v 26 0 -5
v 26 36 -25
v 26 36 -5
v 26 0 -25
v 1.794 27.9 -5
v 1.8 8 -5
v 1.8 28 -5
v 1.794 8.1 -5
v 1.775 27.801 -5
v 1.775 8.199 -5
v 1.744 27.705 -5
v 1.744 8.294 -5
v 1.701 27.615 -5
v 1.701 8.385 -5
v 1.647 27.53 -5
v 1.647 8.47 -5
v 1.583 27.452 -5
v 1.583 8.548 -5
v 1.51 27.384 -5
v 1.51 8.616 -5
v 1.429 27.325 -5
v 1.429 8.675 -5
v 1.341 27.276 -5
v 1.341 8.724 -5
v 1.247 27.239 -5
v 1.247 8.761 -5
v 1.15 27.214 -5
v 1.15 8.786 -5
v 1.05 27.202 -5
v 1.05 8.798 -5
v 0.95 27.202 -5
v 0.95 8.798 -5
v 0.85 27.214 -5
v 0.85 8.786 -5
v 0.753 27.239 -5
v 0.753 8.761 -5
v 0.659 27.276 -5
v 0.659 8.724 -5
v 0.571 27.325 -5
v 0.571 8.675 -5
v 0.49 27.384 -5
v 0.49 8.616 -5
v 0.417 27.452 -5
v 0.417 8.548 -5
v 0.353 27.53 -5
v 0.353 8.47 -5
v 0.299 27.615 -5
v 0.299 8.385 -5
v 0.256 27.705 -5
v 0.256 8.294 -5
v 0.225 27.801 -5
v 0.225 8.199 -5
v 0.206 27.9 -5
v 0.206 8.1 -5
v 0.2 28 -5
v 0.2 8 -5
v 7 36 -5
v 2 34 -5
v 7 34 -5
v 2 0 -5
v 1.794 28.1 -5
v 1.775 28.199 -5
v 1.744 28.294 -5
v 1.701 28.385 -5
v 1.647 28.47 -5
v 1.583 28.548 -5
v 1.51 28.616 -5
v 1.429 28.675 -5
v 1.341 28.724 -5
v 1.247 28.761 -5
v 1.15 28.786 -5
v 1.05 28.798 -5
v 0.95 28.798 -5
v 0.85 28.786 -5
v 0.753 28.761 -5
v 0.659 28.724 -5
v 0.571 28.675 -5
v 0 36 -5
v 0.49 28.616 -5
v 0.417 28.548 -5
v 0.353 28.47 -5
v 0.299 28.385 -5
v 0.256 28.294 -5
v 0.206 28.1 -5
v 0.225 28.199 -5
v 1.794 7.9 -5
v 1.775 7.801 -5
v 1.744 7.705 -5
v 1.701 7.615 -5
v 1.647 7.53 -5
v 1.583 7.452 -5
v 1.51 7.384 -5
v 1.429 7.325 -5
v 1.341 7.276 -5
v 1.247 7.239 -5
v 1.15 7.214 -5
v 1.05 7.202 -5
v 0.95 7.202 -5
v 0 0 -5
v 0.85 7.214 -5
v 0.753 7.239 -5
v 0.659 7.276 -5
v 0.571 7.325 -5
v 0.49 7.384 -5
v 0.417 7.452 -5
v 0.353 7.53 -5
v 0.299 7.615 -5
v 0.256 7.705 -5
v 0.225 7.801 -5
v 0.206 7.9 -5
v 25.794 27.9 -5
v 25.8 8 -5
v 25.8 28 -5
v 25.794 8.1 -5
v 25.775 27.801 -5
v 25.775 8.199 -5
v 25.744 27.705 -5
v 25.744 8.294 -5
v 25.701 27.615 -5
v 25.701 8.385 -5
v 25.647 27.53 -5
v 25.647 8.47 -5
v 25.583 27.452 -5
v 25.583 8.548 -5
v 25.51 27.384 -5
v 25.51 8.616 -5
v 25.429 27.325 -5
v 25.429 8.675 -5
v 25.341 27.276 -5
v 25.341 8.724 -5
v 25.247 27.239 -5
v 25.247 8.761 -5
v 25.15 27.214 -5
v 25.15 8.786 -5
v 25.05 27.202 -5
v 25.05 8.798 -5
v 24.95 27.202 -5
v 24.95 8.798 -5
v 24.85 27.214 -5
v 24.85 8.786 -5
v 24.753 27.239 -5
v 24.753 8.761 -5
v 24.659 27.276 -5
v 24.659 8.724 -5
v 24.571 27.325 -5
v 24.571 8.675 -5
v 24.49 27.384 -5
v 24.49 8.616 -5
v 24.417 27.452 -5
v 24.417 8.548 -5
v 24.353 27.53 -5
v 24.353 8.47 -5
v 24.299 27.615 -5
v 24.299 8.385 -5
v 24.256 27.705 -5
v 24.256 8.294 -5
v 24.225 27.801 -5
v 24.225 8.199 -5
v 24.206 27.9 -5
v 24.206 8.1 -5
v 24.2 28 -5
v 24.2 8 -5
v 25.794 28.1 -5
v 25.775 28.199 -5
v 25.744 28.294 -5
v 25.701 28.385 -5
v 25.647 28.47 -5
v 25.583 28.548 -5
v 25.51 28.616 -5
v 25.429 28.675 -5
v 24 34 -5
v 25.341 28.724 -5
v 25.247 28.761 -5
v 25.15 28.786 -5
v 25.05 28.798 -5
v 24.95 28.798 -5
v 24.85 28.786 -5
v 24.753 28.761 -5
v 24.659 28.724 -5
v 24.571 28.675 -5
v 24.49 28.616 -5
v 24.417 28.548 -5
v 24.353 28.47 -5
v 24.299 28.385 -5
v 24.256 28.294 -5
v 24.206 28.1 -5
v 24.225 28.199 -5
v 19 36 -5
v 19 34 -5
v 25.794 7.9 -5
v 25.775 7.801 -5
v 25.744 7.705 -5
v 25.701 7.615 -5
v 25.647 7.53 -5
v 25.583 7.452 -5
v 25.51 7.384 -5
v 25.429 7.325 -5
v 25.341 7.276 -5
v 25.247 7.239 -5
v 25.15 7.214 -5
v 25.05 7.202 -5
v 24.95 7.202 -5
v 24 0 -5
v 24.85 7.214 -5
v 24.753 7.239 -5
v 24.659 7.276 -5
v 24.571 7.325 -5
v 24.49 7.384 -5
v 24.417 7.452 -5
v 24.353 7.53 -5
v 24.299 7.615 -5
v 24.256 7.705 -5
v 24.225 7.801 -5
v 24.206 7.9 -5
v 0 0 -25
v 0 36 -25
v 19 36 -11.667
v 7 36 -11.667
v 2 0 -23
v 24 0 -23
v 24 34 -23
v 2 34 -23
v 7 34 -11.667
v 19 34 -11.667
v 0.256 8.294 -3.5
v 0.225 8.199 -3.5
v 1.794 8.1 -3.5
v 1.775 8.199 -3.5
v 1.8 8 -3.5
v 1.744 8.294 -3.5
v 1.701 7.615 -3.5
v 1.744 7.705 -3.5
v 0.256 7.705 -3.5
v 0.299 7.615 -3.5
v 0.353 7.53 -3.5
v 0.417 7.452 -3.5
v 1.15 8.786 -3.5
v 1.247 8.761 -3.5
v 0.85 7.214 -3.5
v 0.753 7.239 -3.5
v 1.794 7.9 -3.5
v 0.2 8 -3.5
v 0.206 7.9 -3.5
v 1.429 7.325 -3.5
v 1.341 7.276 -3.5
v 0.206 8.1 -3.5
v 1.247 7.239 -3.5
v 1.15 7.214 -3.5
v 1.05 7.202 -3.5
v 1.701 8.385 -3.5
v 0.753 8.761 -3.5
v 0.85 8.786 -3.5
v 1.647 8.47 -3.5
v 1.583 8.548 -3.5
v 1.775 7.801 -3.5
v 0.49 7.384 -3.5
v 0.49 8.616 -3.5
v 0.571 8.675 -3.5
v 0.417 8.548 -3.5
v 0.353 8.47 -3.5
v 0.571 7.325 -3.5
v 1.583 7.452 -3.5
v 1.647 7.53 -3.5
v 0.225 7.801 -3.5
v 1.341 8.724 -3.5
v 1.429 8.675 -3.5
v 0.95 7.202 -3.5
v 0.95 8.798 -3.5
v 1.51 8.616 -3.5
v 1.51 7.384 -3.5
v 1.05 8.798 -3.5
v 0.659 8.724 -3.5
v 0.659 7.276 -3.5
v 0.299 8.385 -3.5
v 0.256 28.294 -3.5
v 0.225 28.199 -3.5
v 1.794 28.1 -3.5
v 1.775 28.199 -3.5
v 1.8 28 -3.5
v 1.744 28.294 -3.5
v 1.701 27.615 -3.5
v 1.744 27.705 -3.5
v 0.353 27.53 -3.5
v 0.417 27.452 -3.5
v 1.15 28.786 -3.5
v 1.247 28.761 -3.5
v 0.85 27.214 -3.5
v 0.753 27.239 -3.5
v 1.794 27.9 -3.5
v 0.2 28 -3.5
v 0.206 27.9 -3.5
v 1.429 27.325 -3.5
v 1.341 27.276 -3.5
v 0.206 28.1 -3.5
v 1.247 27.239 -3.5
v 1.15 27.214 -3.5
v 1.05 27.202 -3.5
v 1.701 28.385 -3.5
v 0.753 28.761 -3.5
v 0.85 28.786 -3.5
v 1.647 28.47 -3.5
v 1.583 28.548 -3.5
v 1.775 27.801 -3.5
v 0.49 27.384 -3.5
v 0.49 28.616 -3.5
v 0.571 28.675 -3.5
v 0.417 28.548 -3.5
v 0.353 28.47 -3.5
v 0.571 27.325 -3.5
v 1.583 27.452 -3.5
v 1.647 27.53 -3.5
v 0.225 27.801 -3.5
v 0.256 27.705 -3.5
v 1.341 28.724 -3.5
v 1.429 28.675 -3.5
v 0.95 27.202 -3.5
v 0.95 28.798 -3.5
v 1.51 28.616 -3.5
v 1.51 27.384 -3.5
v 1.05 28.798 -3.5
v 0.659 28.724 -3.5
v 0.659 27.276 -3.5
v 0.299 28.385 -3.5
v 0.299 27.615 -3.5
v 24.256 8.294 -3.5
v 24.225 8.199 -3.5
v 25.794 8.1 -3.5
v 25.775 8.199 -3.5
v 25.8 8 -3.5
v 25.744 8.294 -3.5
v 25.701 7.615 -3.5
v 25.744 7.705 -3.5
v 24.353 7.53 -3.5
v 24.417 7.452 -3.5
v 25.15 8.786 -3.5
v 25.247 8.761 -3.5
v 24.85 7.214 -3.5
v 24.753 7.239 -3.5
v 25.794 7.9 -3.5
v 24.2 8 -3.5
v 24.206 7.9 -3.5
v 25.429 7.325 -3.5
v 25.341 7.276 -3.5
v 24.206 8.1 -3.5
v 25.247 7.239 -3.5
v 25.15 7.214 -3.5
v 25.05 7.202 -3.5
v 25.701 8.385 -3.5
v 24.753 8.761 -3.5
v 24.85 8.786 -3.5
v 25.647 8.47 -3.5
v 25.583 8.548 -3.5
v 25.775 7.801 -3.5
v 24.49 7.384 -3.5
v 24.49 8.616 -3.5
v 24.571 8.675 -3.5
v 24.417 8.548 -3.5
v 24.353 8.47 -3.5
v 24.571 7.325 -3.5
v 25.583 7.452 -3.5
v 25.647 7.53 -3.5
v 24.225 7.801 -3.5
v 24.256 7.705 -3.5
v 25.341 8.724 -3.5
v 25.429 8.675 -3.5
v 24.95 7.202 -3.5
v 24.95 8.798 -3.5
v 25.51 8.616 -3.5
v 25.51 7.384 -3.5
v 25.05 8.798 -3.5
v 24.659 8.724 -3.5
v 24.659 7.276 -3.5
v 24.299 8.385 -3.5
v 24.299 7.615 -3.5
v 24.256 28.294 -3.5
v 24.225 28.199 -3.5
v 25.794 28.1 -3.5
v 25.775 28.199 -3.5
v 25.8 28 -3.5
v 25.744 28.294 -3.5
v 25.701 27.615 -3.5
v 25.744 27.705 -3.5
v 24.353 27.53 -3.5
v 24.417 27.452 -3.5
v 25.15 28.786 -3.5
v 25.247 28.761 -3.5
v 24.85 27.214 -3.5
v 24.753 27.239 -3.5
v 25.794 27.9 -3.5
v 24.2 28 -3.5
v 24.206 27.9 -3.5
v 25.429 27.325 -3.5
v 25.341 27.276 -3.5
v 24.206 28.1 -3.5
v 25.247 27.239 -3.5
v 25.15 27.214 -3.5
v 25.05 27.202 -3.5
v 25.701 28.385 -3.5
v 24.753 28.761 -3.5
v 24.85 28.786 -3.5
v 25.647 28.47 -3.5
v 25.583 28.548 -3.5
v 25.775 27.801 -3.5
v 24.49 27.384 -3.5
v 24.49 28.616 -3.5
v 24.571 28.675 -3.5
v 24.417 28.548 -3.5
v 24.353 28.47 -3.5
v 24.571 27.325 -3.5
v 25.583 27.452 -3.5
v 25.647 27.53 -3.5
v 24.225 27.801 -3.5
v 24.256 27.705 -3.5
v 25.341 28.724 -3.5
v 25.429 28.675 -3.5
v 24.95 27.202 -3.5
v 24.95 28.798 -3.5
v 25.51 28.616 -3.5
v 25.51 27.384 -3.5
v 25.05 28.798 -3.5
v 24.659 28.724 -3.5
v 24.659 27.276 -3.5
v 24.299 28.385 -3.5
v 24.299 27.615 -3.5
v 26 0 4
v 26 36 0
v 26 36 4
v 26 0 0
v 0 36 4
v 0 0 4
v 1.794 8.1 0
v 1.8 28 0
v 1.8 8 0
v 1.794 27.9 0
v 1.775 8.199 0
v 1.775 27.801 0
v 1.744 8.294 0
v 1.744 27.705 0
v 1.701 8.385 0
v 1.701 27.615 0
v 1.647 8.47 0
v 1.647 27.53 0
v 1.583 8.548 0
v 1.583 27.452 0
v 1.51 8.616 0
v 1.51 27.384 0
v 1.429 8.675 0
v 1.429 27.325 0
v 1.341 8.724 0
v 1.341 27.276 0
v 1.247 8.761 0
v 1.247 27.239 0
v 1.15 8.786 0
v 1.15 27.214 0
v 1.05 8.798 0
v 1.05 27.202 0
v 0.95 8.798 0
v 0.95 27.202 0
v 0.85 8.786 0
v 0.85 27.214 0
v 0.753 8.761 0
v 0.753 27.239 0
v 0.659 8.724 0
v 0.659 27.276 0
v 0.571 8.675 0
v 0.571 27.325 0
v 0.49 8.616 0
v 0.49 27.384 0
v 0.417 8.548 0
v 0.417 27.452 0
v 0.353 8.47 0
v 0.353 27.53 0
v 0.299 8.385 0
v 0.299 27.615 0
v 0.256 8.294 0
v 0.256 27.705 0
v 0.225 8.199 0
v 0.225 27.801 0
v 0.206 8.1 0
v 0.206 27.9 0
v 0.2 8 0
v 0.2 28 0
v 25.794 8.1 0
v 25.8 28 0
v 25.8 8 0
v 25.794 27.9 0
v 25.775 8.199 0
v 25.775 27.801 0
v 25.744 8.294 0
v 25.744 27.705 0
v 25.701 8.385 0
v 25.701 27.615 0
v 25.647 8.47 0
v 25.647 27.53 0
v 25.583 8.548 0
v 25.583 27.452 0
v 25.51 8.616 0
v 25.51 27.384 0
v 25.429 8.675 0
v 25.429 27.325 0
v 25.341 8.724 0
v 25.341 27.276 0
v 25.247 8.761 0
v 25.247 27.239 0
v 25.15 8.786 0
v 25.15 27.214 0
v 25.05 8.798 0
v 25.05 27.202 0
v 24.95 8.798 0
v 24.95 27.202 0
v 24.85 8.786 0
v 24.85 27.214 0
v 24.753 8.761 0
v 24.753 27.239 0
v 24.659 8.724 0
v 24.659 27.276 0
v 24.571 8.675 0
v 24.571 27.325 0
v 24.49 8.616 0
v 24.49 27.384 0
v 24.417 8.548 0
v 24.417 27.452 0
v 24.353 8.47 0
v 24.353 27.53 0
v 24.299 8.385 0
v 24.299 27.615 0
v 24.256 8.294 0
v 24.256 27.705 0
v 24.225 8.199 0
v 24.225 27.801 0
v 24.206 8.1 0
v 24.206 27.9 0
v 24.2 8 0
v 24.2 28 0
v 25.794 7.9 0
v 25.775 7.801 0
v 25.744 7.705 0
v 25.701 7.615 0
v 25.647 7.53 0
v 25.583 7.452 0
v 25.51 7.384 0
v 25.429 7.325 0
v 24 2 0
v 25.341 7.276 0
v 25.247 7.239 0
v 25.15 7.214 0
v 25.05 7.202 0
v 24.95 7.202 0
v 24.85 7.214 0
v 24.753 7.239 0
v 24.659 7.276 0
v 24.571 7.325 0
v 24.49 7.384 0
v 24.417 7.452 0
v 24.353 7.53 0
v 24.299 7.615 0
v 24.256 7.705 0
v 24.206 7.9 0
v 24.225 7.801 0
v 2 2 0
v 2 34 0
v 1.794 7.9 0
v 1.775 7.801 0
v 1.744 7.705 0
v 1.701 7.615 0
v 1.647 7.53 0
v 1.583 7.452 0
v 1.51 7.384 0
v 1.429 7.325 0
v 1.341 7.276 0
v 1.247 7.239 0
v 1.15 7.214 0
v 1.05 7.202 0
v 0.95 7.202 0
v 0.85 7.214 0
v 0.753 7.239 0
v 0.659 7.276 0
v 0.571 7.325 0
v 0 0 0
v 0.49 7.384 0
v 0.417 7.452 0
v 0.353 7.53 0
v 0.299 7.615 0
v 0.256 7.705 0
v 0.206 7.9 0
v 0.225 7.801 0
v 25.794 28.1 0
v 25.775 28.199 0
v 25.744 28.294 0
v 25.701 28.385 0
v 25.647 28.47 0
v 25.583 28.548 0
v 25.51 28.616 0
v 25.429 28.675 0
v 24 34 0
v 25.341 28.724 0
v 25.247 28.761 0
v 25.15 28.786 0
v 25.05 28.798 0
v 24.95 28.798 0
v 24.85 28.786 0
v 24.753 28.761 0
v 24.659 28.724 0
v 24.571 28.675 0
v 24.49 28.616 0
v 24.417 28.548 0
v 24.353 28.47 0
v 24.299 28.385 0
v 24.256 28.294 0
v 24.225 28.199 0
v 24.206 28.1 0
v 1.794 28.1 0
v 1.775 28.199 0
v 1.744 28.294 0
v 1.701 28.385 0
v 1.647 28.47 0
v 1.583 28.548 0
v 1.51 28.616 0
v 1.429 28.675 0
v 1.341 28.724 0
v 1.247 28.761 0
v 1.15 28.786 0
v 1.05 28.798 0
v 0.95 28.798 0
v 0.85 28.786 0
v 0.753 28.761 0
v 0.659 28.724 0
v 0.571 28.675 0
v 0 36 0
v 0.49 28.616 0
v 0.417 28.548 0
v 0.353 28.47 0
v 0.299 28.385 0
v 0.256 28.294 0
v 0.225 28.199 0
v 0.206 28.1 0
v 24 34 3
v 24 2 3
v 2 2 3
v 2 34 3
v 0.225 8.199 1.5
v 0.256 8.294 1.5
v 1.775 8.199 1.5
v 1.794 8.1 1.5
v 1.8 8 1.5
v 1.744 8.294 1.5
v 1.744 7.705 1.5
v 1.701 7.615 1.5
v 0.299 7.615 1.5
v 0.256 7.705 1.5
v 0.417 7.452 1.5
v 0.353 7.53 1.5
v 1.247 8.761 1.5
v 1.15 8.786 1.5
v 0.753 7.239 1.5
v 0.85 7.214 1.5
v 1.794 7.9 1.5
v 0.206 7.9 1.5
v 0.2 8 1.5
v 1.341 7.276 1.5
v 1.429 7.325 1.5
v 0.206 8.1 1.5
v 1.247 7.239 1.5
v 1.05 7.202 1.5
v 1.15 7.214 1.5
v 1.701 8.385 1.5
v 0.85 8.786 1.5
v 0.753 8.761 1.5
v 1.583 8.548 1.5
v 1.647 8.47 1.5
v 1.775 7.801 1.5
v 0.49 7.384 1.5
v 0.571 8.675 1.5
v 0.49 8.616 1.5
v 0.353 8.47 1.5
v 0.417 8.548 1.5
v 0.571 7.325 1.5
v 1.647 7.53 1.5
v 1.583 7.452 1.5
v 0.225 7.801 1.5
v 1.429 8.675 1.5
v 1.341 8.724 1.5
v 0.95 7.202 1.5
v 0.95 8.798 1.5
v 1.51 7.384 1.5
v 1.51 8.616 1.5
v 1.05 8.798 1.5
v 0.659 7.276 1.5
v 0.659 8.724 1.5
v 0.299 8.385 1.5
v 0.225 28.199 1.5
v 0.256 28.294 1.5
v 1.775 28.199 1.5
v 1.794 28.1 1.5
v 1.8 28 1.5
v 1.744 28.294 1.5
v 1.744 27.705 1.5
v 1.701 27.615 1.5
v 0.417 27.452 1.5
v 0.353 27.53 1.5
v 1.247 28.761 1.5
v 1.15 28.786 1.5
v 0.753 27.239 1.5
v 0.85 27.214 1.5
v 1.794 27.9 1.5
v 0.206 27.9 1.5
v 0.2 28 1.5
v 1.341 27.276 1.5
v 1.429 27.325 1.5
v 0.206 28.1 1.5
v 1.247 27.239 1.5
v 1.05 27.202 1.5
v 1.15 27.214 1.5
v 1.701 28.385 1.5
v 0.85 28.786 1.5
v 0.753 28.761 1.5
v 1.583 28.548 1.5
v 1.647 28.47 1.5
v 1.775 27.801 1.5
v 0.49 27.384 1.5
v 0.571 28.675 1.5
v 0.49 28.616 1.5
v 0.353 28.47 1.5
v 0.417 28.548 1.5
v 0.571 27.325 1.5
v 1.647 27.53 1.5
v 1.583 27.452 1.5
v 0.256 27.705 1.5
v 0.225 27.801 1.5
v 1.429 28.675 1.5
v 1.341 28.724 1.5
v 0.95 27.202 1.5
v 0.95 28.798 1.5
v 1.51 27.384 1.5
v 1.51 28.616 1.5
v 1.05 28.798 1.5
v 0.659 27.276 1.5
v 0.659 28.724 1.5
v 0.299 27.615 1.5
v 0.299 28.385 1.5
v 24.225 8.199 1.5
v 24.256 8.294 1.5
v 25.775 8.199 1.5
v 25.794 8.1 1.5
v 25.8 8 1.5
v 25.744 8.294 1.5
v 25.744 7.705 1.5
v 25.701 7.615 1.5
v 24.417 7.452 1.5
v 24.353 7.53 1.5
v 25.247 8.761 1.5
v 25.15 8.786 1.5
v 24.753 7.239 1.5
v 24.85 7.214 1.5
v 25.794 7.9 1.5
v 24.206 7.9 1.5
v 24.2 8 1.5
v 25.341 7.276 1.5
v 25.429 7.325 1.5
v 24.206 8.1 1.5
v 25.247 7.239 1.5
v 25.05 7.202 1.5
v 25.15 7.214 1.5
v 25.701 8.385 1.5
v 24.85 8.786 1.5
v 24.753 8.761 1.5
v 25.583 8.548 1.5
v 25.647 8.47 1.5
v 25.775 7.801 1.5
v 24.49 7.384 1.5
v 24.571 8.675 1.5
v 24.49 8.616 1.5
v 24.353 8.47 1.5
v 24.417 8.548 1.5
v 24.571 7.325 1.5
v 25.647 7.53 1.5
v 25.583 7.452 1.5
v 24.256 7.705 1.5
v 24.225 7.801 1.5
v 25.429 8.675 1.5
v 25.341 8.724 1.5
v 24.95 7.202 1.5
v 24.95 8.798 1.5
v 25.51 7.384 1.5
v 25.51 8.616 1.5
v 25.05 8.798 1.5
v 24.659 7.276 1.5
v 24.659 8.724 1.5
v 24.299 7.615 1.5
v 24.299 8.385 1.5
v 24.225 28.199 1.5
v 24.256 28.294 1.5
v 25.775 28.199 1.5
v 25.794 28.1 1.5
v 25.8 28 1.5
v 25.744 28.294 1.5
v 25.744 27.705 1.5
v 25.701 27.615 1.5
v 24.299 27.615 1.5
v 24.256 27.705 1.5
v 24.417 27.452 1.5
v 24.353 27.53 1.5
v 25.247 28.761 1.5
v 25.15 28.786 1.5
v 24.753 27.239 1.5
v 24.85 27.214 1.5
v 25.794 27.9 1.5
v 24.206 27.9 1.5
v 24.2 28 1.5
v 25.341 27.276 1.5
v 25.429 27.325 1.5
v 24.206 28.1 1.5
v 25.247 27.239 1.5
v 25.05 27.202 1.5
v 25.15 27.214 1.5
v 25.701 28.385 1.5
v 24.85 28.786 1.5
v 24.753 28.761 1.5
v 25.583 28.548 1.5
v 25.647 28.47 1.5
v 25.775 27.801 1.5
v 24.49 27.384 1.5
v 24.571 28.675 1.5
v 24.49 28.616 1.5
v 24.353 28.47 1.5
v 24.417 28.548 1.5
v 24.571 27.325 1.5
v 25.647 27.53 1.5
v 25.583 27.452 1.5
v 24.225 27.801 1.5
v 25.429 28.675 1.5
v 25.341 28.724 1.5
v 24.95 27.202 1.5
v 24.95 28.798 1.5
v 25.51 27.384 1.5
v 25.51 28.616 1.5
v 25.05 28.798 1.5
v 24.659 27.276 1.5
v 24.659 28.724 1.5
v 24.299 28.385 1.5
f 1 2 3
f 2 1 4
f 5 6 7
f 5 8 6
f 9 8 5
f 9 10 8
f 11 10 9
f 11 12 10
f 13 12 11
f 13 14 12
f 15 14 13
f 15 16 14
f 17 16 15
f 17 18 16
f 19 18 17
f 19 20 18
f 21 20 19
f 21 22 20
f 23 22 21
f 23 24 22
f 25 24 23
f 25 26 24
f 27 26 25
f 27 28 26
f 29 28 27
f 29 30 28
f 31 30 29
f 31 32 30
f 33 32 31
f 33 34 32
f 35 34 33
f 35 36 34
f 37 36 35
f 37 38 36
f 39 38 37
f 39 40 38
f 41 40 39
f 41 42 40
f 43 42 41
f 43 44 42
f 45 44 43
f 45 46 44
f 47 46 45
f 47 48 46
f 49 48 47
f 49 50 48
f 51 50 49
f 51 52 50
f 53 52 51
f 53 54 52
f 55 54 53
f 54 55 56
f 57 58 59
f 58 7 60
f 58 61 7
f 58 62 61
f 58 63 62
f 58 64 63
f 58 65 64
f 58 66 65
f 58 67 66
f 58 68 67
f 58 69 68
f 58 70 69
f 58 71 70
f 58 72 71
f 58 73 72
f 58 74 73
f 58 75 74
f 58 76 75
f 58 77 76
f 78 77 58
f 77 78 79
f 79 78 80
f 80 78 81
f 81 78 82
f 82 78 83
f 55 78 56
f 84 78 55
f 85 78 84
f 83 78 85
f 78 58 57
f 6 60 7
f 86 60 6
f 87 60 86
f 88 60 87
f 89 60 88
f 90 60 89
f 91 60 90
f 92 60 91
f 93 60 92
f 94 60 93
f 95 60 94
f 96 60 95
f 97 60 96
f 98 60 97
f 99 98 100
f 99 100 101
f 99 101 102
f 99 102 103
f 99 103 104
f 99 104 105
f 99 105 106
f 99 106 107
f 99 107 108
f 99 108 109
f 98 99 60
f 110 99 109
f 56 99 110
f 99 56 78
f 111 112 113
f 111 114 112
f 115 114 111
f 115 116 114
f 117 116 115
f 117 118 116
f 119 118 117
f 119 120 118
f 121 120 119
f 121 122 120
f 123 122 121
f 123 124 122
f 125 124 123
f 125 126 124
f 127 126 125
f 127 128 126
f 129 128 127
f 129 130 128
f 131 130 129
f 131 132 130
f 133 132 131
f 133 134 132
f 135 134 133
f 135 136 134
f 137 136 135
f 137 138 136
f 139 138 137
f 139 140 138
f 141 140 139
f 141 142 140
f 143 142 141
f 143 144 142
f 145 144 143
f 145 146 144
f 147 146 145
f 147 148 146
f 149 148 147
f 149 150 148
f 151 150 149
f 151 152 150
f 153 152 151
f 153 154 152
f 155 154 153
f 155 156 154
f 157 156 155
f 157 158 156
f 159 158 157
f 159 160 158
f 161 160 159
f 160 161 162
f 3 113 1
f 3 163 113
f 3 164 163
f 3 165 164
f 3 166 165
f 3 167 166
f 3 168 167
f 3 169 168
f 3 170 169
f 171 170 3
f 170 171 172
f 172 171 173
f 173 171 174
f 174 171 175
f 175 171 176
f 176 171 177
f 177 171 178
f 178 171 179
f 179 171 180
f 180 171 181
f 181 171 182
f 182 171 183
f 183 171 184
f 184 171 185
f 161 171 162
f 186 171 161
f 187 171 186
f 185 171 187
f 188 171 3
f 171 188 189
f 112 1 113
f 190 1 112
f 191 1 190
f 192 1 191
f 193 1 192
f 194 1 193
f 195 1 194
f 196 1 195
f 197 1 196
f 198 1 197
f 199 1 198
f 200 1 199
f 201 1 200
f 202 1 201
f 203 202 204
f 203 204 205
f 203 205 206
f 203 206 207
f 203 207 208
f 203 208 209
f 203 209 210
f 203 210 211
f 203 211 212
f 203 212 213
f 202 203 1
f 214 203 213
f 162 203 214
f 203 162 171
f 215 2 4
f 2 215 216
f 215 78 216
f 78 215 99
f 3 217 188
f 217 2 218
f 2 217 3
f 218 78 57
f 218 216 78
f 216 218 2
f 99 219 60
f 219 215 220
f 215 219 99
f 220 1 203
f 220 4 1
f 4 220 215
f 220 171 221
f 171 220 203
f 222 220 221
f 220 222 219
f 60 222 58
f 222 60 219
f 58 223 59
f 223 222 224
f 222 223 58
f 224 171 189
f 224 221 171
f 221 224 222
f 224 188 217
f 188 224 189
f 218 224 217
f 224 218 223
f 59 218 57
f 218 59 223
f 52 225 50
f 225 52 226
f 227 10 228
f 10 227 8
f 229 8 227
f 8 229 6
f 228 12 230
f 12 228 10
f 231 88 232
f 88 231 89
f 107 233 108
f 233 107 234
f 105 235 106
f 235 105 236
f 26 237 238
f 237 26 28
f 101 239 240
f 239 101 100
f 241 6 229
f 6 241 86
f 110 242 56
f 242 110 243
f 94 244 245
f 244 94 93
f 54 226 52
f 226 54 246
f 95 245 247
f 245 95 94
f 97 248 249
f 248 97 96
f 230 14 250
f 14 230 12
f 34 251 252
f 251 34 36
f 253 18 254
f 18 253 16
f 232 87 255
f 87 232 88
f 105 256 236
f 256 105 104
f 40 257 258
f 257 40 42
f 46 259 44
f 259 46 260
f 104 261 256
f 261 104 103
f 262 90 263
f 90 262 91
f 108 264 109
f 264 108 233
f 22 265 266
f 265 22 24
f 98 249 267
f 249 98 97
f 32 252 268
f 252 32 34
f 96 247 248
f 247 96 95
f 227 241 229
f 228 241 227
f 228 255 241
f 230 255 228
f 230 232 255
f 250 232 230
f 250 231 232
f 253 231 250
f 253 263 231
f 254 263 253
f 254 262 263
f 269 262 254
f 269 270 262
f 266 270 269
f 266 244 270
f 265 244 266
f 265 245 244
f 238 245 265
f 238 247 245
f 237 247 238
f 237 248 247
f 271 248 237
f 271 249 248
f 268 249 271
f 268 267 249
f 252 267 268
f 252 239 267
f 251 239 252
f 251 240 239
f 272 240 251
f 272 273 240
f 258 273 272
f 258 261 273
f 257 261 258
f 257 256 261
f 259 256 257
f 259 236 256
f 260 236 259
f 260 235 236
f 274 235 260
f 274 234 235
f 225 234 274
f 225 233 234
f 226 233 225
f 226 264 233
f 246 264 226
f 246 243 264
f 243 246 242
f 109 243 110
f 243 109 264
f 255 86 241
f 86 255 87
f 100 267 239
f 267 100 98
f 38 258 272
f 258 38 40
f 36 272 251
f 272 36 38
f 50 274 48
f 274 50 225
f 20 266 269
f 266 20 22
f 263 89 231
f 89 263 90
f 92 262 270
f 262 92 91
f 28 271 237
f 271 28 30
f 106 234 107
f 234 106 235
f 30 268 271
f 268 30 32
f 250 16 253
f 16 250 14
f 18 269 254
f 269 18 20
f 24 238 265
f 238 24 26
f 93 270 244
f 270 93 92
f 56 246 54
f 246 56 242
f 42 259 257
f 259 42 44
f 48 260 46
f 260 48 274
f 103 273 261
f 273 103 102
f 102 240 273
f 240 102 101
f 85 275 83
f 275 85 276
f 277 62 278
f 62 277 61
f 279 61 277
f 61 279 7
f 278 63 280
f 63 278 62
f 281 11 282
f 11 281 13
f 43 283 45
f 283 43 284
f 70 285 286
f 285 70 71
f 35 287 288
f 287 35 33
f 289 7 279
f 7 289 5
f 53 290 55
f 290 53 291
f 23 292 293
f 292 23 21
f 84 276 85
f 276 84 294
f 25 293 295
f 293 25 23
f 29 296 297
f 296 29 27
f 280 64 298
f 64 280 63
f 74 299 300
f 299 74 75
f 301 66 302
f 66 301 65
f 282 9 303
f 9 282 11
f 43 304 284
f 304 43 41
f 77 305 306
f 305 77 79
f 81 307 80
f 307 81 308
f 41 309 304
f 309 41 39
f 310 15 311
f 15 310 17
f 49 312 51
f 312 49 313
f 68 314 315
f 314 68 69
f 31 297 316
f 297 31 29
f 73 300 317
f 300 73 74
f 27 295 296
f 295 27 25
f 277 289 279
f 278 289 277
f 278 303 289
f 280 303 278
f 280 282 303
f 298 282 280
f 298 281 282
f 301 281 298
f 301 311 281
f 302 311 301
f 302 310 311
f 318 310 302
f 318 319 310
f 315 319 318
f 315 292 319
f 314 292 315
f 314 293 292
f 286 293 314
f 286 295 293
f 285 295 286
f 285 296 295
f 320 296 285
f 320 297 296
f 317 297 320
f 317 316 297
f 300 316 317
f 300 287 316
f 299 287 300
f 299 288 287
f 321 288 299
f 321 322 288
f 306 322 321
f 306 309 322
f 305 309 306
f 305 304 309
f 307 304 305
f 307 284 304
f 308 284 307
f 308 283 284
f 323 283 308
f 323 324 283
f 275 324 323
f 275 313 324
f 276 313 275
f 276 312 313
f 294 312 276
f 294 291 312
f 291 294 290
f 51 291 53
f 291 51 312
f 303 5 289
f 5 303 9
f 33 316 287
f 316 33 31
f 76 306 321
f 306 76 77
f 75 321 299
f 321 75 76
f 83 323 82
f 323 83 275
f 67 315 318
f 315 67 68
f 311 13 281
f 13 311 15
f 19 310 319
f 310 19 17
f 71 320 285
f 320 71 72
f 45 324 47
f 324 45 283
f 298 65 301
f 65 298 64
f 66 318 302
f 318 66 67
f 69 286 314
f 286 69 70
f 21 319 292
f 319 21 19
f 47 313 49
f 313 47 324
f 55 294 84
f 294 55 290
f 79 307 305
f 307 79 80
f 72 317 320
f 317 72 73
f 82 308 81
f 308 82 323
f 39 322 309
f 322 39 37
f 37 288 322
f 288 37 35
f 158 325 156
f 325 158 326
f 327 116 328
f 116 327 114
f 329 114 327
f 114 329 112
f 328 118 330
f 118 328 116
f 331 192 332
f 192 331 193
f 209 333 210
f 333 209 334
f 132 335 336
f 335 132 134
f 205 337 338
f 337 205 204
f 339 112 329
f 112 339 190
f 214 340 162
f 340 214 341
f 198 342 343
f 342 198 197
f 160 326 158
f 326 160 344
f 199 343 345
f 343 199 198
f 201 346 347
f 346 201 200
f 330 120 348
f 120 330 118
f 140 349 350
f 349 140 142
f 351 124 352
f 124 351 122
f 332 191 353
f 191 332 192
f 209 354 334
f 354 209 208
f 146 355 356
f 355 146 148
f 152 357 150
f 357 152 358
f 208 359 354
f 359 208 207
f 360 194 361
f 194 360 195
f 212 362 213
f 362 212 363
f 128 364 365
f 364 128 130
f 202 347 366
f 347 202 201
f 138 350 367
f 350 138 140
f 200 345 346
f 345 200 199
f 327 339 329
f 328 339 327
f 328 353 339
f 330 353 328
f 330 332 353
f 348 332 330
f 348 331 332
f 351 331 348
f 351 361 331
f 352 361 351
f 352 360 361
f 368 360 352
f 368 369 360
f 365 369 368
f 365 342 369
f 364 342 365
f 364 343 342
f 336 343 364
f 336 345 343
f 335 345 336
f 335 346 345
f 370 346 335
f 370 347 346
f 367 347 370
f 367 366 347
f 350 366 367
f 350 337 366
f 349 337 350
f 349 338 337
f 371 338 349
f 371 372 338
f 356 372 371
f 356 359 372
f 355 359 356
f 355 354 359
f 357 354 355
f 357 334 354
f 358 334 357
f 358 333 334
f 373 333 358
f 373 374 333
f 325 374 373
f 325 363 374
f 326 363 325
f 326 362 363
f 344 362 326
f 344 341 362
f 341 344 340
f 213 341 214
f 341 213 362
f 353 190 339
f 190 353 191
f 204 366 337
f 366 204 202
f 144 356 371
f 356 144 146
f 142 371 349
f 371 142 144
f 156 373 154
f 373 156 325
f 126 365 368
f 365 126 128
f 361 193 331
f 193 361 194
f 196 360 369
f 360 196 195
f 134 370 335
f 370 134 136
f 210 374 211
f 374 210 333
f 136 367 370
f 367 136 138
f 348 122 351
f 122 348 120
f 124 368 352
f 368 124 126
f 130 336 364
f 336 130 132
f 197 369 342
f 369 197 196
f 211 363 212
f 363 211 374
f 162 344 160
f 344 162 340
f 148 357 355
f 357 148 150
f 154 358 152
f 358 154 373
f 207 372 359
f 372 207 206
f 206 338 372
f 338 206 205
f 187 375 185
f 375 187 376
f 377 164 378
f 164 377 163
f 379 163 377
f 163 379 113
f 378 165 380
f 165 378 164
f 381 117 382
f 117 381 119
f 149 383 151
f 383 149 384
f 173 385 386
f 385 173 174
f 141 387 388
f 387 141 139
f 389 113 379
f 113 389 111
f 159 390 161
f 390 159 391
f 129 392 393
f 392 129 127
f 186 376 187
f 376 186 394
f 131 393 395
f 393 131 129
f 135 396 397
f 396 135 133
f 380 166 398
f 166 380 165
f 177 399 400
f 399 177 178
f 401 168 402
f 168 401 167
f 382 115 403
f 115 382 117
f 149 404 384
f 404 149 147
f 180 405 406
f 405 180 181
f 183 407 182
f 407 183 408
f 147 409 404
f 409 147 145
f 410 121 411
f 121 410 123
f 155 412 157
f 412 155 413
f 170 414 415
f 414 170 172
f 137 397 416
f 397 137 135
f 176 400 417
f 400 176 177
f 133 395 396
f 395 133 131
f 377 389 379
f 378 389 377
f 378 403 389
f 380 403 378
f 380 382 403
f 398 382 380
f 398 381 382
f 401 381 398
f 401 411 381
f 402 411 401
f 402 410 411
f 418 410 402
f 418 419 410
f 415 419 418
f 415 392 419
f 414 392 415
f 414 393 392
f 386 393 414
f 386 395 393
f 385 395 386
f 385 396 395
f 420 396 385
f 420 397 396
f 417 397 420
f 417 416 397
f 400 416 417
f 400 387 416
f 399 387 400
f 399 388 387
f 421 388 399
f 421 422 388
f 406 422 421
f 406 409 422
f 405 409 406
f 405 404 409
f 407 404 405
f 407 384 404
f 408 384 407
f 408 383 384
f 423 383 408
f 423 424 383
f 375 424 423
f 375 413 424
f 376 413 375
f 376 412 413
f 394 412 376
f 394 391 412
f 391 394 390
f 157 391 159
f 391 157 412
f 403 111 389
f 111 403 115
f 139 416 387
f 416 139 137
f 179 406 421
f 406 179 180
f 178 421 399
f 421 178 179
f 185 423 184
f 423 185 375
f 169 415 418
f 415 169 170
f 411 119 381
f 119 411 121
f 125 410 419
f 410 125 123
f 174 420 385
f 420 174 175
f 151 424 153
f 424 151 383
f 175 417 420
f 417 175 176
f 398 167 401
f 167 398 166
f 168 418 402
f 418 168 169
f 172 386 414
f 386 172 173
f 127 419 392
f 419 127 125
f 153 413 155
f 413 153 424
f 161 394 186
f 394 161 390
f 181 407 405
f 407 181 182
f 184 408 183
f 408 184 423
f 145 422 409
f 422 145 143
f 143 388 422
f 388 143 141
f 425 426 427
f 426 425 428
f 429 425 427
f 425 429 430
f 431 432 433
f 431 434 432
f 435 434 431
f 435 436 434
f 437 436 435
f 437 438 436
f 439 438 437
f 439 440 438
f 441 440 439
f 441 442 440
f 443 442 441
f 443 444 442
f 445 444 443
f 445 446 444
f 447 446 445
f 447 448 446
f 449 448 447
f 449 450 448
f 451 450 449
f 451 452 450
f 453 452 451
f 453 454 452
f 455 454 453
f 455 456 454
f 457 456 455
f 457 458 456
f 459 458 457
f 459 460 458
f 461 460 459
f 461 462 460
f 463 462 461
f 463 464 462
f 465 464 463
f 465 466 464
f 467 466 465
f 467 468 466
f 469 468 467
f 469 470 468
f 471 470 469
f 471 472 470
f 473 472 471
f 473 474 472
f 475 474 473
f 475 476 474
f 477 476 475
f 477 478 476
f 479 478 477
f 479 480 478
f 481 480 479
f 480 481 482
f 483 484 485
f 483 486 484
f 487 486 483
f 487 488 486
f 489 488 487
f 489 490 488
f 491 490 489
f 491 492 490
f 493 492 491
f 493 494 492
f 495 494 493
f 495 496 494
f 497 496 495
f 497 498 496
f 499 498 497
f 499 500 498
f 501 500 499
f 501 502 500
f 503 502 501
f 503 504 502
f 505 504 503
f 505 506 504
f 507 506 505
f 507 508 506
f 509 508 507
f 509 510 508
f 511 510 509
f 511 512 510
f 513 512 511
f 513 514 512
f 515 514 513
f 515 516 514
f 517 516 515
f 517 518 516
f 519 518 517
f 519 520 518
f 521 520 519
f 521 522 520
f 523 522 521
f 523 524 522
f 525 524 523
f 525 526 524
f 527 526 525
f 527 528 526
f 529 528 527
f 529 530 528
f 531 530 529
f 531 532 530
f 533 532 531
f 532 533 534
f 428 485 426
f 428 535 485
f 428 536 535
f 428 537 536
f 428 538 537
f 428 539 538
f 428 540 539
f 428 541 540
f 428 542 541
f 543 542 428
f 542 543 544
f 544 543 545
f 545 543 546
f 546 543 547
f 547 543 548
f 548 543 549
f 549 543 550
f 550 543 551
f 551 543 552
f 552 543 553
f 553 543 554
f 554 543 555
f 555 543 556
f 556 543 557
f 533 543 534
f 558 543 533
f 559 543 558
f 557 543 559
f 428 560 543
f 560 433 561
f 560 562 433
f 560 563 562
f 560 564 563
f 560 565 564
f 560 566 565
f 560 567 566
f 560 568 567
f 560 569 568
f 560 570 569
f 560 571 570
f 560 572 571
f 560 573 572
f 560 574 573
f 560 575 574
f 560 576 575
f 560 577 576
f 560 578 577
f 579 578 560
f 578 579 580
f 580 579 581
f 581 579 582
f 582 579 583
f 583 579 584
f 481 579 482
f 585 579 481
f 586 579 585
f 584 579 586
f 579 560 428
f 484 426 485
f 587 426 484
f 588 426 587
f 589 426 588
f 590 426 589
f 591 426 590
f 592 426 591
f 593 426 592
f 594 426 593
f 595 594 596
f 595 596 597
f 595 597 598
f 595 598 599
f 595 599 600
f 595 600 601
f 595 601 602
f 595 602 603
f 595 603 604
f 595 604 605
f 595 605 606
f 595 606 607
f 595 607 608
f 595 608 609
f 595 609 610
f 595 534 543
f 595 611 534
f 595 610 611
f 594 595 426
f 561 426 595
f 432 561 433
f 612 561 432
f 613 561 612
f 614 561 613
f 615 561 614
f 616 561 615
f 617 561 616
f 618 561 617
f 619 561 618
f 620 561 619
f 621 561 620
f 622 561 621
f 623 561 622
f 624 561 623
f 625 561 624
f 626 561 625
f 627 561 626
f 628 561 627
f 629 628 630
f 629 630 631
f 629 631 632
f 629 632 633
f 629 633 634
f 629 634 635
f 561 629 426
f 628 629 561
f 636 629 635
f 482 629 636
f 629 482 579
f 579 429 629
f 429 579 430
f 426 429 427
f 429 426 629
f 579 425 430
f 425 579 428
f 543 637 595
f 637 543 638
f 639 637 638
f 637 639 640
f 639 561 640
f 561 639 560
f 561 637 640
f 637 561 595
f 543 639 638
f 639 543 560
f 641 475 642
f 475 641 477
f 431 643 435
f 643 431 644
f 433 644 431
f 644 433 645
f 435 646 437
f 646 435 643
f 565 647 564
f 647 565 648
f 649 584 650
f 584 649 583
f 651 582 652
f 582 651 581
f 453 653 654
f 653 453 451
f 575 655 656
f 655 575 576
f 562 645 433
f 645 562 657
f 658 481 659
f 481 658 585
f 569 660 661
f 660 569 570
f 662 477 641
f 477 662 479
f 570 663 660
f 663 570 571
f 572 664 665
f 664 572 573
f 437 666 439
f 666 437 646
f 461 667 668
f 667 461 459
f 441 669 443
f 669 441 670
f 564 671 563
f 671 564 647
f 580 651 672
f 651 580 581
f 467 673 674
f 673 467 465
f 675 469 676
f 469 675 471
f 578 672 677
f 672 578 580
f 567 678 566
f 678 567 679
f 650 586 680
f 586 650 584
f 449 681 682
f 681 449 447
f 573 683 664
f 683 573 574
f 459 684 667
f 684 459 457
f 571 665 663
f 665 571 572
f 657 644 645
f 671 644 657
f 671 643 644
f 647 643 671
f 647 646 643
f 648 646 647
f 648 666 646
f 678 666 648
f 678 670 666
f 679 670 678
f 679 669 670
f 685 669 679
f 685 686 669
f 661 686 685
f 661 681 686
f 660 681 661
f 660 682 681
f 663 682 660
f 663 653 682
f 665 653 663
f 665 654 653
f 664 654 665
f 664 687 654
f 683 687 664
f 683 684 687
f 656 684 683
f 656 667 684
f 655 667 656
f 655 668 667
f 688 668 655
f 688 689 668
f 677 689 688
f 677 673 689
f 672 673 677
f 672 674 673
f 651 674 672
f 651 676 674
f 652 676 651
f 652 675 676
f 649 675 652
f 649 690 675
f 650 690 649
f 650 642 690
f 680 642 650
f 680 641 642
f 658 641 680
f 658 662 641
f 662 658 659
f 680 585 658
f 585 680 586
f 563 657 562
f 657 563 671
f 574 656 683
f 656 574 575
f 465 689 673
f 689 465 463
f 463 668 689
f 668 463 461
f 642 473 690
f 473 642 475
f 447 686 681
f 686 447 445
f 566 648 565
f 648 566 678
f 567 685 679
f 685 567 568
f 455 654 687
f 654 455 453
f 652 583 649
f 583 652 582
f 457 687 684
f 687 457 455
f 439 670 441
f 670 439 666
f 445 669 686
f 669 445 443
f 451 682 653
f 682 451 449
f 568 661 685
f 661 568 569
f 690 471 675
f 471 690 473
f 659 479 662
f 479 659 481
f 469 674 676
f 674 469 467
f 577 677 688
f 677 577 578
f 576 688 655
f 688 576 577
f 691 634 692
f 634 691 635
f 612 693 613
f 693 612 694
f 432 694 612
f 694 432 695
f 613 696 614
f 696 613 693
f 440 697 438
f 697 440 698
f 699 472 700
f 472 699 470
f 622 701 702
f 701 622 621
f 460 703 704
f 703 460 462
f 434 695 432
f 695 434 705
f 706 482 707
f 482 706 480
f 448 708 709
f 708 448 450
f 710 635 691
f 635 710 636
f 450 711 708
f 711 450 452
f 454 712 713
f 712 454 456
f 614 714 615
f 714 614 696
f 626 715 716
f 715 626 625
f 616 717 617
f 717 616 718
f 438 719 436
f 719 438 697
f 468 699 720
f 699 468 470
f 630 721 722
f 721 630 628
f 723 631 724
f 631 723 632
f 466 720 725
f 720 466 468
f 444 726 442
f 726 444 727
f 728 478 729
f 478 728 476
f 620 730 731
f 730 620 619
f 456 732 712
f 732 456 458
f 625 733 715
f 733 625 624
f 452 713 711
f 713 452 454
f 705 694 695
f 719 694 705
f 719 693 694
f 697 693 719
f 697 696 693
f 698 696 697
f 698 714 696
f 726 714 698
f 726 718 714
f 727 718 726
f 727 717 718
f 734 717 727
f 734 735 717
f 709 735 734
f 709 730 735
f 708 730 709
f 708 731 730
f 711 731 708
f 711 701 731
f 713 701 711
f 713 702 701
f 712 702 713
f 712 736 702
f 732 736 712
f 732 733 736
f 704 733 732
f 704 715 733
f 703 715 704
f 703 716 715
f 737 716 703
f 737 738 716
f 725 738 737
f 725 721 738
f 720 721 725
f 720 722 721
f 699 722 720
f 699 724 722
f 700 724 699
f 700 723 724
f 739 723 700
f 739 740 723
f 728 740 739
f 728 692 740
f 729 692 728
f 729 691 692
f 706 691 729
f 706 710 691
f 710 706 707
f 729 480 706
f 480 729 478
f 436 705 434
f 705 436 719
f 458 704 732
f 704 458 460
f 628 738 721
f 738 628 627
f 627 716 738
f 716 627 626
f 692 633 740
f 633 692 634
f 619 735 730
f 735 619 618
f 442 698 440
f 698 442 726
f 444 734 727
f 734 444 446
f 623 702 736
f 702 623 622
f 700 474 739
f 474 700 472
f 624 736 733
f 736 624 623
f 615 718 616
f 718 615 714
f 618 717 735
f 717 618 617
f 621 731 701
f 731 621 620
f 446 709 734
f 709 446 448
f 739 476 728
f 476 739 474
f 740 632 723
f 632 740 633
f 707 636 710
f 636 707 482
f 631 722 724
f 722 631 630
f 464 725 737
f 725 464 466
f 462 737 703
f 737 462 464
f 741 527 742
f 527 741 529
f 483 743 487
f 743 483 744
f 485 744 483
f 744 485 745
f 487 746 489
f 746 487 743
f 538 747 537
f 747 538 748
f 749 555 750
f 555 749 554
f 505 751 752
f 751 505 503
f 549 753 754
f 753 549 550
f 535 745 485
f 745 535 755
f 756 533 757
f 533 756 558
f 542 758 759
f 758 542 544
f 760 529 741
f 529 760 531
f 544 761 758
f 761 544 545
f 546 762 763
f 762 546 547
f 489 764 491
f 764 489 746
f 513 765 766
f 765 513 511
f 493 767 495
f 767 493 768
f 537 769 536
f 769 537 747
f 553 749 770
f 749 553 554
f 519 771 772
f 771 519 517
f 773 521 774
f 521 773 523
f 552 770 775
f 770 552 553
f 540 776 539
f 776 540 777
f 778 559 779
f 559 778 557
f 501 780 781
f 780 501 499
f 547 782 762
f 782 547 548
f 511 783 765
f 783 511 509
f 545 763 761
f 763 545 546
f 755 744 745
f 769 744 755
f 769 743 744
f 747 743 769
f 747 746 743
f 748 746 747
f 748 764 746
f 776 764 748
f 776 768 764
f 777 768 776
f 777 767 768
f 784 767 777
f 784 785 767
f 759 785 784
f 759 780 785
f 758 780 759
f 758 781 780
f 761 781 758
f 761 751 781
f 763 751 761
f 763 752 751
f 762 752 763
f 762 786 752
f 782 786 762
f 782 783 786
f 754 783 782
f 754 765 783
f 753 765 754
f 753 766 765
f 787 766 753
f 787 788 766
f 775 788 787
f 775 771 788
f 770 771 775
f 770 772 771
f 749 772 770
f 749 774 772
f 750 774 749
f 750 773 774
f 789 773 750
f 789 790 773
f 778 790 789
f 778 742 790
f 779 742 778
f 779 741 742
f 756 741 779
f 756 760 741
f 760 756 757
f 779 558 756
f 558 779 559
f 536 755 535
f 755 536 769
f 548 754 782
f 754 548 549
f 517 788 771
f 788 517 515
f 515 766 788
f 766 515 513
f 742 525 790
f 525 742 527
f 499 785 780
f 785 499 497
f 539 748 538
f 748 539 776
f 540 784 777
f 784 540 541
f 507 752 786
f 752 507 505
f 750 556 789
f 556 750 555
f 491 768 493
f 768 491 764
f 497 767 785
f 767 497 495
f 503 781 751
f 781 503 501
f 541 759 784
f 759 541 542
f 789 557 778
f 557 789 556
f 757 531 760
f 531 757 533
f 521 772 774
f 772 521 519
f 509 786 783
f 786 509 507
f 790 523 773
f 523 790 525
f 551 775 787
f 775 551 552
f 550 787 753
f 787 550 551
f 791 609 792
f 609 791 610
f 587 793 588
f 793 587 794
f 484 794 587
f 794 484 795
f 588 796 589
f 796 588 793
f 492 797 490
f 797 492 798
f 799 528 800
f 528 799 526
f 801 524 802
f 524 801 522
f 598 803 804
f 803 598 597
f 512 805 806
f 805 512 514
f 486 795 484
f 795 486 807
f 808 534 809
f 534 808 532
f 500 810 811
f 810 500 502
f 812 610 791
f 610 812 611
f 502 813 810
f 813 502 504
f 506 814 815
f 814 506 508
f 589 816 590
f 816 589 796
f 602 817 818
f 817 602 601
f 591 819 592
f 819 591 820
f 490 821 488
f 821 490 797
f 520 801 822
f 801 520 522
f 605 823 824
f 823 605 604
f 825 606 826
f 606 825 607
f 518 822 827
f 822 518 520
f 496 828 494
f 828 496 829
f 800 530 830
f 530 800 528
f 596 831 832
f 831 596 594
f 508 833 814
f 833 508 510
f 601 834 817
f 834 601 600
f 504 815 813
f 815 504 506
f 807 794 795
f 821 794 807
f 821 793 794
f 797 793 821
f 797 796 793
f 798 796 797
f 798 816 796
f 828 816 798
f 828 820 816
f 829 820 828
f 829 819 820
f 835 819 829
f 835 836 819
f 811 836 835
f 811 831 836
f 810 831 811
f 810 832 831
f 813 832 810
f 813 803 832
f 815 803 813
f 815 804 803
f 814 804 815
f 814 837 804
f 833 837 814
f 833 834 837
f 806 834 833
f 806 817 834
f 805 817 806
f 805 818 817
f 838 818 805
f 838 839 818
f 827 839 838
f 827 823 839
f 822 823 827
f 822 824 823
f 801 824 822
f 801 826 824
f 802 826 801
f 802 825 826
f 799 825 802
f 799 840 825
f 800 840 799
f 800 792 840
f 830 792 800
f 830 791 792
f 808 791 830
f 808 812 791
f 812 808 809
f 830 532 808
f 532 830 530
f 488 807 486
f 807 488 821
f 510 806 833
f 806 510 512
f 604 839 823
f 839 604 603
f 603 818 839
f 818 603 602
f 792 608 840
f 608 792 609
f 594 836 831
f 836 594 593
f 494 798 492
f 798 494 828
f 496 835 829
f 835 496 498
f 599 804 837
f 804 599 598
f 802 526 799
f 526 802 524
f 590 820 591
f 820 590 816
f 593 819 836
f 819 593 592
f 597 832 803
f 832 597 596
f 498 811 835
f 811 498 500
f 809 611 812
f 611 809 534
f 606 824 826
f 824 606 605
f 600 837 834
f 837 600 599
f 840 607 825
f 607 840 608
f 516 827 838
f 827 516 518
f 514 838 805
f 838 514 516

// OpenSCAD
peg_radius = 0.8;
peg_height = 3;
peg_faces = 50;

module create_peg (x, y, h) {
	translate([x, y, h]) cylinder(h = peg_height, r = peg_radius, $fn = peg_faces);
}


module top() {

	height = 20;
	peg_depth = height - 1.5;

	translate([0, 0, -25]) {
		 difference() {
			// Nase cube with cutout
			cube([26, 36, height]);
			translate([2, 2, 2]) cube([22, 32, height]);

			// MIDI Cutout
			translate([2, 0, 2]) cube([22, 2, height]);

			// Pin Curout
			translate([7, 34, height / 1.5]) cube([12, 2, height]);
		}

		// Cylindrical pegs
		create_peg(1, 8, peg_depth);
		create_peg(1, 28, peg_depth);
		create_peg(25, 8, peg_depth);
		create_peg(25, 28, peg_depth);
	}	
}

module bottom() {
	
	height = 4;
	peg_depth = -1.5;

	difference() {
		// Base cube with cutout
		cube([26, 36, height]);
		translate([2, 2, -1]) cube([22, 32, height]);

		// Cylindrical peg holes
		create_peg(1, 8, peg_depth);
		create_peg(1, 28, peg_depth);
		create_peg(25, 8, peg_depth);
		create_peg(25, 28, peg_depth);
	}
}


top();
bottom();
